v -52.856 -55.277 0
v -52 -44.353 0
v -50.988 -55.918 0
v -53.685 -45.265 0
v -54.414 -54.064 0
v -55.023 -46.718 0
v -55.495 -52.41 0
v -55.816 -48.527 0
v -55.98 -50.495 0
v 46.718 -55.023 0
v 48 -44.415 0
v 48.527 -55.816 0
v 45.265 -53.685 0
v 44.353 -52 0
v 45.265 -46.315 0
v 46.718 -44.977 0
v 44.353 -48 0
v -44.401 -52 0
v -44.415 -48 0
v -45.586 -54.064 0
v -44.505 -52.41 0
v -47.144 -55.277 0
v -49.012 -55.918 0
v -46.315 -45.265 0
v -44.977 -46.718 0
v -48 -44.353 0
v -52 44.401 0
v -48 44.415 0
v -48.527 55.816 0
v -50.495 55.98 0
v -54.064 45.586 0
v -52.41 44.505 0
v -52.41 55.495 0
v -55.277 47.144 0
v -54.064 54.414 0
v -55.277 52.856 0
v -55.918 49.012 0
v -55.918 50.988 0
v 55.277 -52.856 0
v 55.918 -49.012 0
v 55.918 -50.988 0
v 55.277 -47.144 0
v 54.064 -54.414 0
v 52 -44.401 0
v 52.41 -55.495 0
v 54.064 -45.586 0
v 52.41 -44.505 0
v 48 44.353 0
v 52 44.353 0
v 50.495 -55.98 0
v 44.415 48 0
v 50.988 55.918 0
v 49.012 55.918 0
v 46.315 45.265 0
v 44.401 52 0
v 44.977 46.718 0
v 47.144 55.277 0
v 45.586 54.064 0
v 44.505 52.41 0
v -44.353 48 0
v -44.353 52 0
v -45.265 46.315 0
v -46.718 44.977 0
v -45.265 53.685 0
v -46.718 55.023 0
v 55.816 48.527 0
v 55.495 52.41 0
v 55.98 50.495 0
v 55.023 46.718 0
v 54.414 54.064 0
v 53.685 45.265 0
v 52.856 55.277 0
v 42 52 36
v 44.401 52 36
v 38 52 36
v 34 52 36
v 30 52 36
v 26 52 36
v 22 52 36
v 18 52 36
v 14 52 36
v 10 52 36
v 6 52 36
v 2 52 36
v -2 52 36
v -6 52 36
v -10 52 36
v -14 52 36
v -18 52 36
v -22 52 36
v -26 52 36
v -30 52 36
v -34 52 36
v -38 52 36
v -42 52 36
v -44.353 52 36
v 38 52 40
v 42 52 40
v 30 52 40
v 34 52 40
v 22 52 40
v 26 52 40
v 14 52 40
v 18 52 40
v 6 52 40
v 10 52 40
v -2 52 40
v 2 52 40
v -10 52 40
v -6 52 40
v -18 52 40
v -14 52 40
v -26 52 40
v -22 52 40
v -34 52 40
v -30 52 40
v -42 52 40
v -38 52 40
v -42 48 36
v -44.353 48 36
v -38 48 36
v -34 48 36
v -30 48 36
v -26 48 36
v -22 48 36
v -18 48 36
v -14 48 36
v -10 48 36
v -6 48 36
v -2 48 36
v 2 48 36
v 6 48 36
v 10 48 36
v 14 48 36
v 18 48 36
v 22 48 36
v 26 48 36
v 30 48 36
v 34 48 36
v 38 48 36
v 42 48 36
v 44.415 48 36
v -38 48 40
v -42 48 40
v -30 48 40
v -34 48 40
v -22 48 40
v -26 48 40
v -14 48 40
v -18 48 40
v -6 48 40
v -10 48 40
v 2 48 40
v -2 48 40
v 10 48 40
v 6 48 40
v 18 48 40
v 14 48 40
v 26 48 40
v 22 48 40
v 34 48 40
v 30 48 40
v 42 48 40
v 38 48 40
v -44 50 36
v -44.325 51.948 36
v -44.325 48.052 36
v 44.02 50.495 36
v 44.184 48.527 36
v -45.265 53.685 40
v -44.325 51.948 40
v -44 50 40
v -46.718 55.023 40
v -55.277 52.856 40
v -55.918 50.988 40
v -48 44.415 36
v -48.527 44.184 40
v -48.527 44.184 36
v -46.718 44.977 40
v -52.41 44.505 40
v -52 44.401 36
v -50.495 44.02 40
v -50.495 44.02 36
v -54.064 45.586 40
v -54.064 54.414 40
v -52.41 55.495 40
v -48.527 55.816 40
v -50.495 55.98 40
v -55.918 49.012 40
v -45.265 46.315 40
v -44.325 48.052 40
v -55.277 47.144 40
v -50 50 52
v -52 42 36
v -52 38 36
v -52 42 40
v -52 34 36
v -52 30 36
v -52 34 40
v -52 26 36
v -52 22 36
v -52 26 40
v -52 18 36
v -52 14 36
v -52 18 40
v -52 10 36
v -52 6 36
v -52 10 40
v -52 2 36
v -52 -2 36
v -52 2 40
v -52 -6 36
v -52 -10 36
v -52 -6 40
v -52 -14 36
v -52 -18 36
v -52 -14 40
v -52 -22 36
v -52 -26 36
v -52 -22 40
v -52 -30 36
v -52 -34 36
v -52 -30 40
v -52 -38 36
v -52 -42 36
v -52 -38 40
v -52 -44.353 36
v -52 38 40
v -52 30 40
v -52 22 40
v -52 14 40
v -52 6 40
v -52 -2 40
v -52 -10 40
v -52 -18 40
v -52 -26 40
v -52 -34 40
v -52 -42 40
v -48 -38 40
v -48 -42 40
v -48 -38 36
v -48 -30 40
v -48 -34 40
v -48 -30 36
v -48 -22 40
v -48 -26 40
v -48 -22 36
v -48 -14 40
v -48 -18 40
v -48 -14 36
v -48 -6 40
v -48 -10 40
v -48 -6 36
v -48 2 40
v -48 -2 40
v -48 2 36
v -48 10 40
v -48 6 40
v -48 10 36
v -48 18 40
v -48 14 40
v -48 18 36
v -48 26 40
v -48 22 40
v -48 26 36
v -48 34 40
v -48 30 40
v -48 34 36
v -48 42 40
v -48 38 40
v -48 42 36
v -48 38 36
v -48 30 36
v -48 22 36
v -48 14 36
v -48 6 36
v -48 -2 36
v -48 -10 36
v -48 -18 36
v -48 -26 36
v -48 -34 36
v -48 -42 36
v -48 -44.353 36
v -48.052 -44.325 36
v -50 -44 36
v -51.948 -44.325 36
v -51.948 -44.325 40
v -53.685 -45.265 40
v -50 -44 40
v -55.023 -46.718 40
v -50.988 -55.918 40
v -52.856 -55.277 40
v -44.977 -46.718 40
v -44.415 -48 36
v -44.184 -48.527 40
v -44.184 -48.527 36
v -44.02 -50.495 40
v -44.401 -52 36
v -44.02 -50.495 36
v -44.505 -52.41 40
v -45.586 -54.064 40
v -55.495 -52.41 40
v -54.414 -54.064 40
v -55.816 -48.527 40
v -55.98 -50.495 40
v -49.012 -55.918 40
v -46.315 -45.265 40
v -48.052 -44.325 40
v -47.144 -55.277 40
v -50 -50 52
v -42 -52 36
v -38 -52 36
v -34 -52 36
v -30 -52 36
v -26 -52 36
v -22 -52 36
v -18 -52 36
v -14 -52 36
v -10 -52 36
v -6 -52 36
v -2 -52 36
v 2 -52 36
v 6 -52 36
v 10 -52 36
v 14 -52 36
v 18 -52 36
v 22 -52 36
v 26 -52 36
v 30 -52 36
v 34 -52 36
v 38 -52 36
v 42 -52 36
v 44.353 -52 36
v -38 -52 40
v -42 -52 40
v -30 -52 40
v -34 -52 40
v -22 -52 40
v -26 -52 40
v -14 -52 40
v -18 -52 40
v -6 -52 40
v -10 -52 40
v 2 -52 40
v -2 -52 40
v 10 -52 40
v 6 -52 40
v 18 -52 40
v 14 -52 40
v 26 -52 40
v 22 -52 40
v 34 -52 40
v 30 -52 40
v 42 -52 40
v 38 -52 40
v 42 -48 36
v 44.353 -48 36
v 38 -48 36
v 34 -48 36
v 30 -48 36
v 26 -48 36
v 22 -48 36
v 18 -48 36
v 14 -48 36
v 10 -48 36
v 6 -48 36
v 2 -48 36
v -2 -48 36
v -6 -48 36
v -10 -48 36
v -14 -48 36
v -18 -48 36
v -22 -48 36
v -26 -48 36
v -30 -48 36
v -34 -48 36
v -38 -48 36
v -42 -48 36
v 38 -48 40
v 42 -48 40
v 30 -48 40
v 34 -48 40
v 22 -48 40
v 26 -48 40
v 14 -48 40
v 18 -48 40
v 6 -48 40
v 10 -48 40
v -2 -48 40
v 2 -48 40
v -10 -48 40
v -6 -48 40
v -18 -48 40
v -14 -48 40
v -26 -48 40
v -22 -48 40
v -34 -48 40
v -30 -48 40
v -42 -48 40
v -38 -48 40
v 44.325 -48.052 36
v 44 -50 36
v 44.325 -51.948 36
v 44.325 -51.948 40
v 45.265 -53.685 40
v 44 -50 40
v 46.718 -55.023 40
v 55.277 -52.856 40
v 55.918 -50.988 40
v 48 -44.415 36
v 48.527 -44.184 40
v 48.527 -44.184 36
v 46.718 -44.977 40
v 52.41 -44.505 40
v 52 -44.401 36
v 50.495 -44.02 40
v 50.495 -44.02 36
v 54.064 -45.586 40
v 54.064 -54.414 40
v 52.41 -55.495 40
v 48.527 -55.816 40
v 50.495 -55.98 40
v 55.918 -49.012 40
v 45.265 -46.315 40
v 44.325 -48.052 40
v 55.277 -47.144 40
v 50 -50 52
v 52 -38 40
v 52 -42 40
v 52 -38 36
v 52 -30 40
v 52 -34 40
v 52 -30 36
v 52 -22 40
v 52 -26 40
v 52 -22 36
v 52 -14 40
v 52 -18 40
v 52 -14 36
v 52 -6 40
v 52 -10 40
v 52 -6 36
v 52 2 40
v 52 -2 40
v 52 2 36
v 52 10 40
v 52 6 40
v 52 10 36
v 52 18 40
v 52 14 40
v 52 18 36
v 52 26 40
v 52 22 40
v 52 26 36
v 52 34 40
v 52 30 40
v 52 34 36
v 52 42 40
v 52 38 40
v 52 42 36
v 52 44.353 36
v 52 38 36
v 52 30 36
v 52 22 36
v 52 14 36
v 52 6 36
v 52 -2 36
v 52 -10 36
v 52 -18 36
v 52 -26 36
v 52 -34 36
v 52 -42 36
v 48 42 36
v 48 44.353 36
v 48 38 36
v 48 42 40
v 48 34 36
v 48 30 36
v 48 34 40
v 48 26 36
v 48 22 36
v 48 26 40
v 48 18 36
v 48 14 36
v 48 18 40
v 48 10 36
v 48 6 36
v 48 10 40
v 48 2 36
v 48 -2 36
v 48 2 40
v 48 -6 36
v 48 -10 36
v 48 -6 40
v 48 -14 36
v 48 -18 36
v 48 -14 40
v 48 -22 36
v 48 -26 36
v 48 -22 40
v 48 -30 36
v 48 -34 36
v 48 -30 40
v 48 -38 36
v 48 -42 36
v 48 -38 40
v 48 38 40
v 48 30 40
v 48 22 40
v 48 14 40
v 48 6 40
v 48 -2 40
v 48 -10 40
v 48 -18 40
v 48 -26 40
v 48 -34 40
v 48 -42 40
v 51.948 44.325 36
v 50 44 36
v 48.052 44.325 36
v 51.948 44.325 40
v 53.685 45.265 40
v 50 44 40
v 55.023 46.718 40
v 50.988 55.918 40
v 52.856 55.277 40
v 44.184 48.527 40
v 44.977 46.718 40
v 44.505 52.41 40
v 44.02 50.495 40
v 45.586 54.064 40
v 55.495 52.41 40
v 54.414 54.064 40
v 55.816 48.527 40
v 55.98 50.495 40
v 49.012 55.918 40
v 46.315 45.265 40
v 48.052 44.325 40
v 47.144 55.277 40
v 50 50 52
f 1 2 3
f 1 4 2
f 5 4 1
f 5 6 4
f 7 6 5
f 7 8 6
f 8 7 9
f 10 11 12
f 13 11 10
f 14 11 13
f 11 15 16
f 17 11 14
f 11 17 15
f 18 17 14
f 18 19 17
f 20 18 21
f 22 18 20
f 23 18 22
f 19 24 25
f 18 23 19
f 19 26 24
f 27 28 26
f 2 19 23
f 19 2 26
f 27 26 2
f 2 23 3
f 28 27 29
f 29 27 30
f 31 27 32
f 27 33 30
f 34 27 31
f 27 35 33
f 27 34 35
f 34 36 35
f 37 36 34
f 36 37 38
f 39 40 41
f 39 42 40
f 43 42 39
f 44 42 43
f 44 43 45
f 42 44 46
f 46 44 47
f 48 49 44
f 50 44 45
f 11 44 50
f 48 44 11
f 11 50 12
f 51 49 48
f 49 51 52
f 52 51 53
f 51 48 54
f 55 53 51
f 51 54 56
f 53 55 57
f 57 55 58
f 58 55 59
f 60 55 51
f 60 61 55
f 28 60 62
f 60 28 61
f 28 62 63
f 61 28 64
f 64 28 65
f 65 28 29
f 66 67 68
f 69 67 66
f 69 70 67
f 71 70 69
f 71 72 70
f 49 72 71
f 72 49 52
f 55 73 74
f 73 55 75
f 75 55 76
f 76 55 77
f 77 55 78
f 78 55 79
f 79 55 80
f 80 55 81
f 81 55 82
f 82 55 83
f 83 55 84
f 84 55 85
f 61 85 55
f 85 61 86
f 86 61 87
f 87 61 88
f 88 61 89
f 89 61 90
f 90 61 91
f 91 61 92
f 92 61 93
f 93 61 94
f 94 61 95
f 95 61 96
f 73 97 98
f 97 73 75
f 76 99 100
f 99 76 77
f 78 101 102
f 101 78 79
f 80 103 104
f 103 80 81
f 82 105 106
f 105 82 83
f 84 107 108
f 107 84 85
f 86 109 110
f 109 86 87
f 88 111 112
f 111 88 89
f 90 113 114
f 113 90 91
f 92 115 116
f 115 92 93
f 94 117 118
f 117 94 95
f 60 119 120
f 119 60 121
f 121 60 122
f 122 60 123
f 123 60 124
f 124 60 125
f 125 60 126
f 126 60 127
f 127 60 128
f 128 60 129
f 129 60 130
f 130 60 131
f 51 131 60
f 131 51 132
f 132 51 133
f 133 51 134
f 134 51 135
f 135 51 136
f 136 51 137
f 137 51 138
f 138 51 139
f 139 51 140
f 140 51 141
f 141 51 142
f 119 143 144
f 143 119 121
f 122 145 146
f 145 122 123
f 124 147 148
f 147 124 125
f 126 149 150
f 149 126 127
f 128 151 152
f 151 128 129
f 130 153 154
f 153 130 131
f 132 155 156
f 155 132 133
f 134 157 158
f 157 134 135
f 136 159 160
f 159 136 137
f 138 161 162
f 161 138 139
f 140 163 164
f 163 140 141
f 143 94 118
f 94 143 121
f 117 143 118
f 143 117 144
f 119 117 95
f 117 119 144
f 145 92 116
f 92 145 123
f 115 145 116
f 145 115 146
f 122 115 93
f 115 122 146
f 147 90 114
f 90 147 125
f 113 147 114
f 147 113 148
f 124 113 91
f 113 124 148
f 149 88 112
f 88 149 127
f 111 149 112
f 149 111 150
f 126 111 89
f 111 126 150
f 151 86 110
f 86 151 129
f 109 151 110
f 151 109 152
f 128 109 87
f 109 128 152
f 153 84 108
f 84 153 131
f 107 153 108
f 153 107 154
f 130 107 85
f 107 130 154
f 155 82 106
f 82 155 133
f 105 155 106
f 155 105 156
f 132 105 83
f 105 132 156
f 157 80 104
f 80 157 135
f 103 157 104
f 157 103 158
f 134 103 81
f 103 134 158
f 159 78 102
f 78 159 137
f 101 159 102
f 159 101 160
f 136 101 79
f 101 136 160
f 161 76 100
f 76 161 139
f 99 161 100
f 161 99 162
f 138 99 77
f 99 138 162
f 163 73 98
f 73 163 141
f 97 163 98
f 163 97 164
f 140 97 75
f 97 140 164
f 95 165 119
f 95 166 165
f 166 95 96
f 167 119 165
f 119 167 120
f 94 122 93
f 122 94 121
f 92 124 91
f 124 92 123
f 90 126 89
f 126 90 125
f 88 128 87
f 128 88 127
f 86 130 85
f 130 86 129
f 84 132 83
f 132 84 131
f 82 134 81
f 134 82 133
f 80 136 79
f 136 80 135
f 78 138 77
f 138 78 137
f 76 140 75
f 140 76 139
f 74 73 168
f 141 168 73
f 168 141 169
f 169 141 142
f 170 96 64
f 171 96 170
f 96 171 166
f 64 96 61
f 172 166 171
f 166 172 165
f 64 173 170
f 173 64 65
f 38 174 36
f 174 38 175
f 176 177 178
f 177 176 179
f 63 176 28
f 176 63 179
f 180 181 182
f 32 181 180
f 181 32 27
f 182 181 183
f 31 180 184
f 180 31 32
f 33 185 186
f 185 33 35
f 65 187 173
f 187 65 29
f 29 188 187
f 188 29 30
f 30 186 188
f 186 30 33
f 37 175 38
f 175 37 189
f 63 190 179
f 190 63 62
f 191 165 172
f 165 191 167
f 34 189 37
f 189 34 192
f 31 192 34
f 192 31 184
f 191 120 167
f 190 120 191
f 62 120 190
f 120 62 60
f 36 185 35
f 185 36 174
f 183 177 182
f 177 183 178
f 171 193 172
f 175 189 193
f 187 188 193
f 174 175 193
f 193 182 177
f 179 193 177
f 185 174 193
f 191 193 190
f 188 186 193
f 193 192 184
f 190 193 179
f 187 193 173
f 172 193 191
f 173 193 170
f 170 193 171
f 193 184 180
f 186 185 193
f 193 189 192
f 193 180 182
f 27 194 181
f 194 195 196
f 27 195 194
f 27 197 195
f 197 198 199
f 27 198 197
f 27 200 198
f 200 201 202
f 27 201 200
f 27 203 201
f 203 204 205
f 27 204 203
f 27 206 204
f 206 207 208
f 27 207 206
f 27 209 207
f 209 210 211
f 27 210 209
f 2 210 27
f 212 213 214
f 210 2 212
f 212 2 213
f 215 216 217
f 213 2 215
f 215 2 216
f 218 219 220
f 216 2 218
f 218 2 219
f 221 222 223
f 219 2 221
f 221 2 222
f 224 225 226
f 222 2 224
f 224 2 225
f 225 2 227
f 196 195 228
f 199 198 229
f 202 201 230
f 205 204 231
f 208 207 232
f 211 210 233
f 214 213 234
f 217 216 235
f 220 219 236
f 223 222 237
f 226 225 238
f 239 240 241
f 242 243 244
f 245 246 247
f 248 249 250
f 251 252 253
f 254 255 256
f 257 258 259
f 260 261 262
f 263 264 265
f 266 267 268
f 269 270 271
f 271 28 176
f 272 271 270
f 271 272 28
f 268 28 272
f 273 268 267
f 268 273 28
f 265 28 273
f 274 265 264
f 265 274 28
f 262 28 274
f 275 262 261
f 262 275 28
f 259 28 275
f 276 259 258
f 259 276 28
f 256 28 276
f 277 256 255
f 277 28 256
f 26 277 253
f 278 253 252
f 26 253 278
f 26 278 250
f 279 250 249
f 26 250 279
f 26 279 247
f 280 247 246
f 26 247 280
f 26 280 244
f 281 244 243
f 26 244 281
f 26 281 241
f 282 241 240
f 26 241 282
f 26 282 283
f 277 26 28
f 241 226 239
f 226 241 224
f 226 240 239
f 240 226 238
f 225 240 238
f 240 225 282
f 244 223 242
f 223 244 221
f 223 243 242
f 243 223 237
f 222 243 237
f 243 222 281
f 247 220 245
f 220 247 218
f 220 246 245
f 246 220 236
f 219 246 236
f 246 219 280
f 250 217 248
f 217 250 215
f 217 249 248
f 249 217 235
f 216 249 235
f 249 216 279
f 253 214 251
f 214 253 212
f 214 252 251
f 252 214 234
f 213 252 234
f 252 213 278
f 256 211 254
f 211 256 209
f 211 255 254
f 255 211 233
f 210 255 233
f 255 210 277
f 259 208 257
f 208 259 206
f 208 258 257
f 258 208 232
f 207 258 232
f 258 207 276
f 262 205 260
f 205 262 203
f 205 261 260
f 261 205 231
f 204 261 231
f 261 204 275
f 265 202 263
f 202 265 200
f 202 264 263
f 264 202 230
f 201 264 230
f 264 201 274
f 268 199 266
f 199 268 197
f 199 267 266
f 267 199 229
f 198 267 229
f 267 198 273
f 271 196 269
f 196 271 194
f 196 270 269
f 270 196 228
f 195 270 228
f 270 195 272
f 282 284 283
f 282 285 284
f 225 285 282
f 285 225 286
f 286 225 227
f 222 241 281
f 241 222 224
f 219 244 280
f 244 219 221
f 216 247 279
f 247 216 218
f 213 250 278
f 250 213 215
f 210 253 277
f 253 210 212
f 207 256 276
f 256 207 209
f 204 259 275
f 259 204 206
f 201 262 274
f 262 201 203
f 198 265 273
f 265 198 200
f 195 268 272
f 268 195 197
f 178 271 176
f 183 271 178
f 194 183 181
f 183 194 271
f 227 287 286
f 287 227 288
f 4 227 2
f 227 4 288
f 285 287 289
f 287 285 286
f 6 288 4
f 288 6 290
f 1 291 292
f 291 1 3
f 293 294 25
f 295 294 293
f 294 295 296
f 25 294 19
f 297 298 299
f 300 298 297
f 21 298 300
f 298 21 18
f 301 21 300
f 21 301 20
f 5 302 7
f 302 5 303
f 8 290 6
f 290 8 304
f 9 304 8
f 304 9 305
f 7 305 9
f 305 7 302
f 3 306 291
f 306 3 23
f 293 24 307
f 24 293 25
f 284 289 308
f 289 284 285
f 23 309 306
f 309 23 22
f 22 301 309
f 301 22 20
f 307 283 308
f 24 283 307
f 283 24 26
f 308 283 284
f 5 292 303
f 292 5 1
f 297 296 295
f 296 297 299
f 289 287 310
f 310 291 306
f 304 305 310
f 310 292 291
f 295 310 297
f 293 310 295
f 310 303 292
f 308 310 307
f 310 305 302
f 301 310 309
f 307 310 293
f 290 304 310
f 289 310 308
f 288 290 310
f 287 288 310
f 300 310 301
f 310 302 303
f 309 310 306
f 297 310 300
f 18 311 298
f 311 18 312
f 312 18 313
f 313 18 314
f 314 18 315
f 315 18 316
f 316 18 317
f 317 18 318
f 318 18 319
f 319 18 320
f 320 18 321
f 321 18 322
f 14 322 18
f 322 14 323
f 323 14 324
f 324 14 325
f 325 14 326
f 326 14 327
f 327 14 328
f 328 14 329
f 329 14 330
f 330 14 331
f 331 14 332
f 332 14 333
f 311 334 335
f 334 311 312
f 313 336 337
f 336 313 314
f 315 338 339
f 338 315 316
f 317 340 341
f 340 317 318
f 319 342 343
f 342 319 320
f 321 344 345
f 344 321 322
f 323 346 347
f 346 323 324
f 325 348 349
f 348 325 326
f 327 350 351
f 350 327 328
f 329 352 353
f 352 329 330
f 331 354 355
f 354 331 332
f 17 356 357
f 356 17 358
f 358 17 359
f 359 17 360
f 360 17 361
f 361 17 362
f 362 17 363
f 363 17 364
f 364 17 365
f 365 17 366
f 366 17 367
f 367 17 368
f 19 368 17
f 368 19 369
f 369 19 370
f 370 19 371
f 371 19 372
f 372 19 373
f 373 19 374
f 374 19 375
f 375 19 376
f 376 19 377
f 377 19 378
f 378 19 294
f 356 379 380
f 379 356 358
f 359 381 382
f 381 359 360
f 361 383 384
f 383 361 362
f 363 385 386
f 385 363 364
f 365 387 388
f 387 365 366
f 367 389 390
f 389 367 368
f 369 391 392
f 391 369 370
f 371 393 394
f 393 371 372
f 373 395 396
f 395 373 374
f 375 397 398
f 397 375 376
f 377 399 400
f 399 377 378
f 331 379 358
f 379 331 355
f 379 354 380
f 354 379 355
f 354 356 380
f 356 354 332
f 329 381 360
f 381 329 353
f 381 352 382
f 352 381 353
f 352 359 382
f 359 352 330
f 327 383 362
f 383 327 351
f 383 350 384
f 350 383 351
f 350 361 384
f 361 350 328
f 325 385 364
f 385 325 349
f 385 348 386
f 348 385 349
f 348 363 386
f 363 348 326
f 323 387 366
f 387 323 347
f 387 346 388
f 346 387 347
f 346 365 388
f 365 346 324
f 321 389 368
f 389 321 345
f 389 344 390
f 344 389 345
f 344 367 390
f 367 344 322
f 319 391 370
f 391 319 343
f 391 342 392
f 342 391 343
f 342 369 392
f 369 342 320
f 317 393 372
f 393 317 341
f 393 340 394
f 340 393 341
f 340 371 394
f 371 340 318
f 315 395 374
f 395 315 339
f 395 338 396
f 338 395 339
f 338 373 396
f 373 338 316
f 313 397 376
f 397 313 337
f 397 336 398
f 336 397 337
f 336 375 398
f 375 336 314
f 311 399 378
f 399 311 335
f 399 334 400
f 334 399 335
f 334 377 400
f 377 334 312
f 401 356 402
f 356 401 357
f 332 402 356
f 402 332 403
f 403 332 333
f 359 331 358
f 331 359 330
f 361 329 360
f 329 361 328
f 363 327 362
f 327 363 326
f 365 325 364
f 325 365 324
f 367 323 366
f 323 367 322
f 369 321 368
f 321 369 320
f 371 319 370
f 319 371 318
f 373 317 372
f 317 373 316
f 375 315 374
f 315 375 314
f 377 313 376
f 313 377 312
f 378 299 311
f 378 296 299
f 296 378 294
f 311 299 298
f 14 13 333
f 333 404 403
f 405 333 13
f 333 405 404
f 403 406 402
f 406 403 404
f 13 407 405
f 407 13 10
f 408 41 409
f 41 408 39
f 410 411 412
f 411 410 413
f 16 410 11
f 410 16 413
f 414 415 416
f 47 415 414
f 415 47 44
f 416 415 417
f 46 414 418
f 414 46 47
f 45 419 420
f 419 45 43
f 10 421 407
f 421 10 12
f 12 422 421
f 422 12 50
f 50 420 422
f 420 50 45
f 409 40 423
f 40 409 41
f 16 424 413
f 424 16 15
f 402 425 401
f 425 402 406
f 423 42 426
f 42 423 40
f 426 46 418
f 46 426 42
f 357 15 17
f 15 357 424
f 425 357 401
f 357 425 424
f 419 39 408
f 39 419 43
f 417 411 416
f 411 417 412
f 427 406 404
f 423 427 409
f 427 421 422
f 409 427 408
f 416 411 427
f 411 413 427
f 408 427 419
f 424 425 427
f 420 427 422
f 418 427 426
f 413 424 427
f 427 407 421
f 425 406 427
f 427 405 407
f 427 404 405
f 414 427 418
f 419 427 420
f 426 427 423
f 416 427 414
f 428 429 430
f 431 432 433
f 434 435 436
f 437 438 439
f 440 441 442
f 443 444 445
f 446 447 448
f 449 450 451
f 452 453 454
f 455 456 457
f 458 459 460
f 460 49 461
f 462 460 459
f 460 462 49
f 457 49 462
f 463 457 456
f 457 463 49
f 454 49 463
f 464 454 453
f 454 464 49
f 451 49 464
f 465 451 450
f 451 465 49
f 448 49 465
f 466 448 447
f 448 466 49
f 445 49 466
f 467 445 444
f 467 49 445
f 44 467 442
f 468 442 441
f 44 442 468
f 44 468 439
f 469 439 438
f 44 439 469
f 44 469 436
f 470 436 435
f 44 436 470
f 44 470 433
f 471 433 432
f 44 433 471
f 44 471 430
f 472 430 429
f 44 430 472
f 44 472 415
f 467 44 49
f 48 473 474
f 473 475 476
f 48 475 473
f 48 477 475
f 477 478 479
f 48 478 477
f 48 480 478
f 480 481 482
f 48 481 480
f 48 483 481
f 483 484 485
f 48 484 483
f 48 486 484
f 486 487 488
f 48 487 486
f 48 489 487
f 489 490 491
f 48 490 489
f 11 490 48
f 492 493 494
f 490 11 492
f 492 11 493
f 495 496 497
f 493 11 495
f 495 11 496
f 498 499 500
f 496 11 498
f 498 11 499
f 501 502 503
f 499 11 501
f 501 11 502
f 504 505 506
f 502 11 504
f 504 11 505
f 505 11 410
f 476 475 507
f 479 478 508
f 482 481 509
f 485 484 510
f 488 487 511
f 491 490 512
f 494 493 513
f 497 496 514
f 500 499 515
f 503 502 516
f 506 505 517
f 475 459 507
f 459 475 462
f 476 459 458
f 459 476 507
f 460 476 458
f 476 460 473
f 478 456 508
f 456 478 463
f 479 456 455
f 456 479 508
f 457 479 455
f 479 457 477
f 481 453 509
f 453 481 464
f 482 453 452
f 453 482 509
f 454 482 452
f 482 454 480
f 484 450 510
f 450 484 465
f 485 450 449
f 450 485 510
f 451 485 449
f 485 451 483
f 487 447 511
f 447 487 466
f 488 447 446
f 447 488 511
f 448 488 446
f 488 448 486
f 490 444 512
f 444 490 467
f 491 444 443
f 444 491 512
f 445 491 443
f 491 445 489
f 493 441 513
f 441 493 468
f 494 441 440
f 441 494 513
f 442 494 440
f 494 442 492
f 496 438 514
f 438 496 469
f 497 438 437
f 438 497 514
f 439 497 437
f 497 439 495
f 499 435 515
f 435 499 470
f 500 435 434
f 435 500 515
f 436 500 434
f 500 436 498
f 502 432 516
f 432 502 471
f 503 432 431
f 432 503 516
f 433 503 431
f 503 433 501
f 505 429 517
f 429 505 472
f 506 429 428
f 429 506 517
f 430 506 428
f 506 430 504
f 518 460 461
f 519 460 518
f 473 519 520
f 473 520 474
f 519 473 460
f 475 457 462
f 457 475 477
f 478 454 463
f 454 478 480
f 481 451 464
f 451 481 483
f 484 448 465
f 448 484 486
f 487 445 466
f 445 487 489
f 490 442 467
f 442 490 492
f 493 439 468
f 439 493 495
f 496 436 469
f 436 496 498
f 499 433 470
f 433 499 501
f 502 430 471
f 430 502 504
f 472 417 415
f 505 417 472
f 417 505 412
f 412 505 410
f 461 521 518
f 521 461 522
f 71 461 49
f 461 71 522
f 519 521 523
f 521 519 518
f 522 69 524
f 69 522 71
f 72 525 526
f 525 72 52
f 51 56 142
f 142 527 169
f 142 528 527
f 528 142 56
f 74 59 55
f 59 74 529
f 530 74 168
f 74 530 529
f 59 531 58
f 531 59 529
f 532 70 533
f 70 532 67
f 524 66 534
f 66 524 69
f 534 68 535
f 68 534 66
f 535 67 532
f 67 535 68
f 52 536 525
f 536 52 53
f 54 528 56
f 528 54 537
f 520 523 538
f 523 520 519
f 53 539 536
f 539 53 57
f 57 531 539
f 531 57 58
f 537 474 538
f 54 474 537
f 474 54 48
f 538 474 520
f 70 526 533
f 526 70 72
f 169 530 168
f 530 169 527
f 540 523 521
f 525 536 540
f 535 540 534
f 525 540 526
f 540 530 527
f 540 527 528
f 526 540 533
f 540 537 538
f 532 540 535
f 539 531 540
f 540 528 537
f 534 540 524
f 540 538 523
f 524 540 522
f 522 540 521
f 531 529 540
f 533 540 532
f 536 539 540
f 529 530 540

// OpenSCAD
// file castle.scad
// Creates a simple castle wall with towers and crenellation
// (c) 2020 Rich Cameron
// released under a Creative Commons CC-BY 4.0 International License

wall = 100; //length of a castle wall, mm
height = 40; //height of a castle wall, mm
thick = 4; //thickness of the wall, mm


for(side = [0:1:3]) {
	rotate(90 * side) {
		translate([-wall / 2, wall / 2, 0]) {
			translate([0, -thick / 2, 0]) {
				cube([wall, thick, height - thick]);
				for(crenellation = [0:thick * 2:wall - thick]) {
					translate([crenellation, 0, 0]) {
						cube([thick, thick, height]);
					} //end translate
				} //end for
			} //end translate

			cylinder(h = height, r = 1.5 * thick);
			translate([0, 0, height]) {
				cylinder(h = 3 * thick, r1 = 1.5 * thick, r2 = 0);
			} //end translate
		} //end translate
	} //end rotate
} //end for
